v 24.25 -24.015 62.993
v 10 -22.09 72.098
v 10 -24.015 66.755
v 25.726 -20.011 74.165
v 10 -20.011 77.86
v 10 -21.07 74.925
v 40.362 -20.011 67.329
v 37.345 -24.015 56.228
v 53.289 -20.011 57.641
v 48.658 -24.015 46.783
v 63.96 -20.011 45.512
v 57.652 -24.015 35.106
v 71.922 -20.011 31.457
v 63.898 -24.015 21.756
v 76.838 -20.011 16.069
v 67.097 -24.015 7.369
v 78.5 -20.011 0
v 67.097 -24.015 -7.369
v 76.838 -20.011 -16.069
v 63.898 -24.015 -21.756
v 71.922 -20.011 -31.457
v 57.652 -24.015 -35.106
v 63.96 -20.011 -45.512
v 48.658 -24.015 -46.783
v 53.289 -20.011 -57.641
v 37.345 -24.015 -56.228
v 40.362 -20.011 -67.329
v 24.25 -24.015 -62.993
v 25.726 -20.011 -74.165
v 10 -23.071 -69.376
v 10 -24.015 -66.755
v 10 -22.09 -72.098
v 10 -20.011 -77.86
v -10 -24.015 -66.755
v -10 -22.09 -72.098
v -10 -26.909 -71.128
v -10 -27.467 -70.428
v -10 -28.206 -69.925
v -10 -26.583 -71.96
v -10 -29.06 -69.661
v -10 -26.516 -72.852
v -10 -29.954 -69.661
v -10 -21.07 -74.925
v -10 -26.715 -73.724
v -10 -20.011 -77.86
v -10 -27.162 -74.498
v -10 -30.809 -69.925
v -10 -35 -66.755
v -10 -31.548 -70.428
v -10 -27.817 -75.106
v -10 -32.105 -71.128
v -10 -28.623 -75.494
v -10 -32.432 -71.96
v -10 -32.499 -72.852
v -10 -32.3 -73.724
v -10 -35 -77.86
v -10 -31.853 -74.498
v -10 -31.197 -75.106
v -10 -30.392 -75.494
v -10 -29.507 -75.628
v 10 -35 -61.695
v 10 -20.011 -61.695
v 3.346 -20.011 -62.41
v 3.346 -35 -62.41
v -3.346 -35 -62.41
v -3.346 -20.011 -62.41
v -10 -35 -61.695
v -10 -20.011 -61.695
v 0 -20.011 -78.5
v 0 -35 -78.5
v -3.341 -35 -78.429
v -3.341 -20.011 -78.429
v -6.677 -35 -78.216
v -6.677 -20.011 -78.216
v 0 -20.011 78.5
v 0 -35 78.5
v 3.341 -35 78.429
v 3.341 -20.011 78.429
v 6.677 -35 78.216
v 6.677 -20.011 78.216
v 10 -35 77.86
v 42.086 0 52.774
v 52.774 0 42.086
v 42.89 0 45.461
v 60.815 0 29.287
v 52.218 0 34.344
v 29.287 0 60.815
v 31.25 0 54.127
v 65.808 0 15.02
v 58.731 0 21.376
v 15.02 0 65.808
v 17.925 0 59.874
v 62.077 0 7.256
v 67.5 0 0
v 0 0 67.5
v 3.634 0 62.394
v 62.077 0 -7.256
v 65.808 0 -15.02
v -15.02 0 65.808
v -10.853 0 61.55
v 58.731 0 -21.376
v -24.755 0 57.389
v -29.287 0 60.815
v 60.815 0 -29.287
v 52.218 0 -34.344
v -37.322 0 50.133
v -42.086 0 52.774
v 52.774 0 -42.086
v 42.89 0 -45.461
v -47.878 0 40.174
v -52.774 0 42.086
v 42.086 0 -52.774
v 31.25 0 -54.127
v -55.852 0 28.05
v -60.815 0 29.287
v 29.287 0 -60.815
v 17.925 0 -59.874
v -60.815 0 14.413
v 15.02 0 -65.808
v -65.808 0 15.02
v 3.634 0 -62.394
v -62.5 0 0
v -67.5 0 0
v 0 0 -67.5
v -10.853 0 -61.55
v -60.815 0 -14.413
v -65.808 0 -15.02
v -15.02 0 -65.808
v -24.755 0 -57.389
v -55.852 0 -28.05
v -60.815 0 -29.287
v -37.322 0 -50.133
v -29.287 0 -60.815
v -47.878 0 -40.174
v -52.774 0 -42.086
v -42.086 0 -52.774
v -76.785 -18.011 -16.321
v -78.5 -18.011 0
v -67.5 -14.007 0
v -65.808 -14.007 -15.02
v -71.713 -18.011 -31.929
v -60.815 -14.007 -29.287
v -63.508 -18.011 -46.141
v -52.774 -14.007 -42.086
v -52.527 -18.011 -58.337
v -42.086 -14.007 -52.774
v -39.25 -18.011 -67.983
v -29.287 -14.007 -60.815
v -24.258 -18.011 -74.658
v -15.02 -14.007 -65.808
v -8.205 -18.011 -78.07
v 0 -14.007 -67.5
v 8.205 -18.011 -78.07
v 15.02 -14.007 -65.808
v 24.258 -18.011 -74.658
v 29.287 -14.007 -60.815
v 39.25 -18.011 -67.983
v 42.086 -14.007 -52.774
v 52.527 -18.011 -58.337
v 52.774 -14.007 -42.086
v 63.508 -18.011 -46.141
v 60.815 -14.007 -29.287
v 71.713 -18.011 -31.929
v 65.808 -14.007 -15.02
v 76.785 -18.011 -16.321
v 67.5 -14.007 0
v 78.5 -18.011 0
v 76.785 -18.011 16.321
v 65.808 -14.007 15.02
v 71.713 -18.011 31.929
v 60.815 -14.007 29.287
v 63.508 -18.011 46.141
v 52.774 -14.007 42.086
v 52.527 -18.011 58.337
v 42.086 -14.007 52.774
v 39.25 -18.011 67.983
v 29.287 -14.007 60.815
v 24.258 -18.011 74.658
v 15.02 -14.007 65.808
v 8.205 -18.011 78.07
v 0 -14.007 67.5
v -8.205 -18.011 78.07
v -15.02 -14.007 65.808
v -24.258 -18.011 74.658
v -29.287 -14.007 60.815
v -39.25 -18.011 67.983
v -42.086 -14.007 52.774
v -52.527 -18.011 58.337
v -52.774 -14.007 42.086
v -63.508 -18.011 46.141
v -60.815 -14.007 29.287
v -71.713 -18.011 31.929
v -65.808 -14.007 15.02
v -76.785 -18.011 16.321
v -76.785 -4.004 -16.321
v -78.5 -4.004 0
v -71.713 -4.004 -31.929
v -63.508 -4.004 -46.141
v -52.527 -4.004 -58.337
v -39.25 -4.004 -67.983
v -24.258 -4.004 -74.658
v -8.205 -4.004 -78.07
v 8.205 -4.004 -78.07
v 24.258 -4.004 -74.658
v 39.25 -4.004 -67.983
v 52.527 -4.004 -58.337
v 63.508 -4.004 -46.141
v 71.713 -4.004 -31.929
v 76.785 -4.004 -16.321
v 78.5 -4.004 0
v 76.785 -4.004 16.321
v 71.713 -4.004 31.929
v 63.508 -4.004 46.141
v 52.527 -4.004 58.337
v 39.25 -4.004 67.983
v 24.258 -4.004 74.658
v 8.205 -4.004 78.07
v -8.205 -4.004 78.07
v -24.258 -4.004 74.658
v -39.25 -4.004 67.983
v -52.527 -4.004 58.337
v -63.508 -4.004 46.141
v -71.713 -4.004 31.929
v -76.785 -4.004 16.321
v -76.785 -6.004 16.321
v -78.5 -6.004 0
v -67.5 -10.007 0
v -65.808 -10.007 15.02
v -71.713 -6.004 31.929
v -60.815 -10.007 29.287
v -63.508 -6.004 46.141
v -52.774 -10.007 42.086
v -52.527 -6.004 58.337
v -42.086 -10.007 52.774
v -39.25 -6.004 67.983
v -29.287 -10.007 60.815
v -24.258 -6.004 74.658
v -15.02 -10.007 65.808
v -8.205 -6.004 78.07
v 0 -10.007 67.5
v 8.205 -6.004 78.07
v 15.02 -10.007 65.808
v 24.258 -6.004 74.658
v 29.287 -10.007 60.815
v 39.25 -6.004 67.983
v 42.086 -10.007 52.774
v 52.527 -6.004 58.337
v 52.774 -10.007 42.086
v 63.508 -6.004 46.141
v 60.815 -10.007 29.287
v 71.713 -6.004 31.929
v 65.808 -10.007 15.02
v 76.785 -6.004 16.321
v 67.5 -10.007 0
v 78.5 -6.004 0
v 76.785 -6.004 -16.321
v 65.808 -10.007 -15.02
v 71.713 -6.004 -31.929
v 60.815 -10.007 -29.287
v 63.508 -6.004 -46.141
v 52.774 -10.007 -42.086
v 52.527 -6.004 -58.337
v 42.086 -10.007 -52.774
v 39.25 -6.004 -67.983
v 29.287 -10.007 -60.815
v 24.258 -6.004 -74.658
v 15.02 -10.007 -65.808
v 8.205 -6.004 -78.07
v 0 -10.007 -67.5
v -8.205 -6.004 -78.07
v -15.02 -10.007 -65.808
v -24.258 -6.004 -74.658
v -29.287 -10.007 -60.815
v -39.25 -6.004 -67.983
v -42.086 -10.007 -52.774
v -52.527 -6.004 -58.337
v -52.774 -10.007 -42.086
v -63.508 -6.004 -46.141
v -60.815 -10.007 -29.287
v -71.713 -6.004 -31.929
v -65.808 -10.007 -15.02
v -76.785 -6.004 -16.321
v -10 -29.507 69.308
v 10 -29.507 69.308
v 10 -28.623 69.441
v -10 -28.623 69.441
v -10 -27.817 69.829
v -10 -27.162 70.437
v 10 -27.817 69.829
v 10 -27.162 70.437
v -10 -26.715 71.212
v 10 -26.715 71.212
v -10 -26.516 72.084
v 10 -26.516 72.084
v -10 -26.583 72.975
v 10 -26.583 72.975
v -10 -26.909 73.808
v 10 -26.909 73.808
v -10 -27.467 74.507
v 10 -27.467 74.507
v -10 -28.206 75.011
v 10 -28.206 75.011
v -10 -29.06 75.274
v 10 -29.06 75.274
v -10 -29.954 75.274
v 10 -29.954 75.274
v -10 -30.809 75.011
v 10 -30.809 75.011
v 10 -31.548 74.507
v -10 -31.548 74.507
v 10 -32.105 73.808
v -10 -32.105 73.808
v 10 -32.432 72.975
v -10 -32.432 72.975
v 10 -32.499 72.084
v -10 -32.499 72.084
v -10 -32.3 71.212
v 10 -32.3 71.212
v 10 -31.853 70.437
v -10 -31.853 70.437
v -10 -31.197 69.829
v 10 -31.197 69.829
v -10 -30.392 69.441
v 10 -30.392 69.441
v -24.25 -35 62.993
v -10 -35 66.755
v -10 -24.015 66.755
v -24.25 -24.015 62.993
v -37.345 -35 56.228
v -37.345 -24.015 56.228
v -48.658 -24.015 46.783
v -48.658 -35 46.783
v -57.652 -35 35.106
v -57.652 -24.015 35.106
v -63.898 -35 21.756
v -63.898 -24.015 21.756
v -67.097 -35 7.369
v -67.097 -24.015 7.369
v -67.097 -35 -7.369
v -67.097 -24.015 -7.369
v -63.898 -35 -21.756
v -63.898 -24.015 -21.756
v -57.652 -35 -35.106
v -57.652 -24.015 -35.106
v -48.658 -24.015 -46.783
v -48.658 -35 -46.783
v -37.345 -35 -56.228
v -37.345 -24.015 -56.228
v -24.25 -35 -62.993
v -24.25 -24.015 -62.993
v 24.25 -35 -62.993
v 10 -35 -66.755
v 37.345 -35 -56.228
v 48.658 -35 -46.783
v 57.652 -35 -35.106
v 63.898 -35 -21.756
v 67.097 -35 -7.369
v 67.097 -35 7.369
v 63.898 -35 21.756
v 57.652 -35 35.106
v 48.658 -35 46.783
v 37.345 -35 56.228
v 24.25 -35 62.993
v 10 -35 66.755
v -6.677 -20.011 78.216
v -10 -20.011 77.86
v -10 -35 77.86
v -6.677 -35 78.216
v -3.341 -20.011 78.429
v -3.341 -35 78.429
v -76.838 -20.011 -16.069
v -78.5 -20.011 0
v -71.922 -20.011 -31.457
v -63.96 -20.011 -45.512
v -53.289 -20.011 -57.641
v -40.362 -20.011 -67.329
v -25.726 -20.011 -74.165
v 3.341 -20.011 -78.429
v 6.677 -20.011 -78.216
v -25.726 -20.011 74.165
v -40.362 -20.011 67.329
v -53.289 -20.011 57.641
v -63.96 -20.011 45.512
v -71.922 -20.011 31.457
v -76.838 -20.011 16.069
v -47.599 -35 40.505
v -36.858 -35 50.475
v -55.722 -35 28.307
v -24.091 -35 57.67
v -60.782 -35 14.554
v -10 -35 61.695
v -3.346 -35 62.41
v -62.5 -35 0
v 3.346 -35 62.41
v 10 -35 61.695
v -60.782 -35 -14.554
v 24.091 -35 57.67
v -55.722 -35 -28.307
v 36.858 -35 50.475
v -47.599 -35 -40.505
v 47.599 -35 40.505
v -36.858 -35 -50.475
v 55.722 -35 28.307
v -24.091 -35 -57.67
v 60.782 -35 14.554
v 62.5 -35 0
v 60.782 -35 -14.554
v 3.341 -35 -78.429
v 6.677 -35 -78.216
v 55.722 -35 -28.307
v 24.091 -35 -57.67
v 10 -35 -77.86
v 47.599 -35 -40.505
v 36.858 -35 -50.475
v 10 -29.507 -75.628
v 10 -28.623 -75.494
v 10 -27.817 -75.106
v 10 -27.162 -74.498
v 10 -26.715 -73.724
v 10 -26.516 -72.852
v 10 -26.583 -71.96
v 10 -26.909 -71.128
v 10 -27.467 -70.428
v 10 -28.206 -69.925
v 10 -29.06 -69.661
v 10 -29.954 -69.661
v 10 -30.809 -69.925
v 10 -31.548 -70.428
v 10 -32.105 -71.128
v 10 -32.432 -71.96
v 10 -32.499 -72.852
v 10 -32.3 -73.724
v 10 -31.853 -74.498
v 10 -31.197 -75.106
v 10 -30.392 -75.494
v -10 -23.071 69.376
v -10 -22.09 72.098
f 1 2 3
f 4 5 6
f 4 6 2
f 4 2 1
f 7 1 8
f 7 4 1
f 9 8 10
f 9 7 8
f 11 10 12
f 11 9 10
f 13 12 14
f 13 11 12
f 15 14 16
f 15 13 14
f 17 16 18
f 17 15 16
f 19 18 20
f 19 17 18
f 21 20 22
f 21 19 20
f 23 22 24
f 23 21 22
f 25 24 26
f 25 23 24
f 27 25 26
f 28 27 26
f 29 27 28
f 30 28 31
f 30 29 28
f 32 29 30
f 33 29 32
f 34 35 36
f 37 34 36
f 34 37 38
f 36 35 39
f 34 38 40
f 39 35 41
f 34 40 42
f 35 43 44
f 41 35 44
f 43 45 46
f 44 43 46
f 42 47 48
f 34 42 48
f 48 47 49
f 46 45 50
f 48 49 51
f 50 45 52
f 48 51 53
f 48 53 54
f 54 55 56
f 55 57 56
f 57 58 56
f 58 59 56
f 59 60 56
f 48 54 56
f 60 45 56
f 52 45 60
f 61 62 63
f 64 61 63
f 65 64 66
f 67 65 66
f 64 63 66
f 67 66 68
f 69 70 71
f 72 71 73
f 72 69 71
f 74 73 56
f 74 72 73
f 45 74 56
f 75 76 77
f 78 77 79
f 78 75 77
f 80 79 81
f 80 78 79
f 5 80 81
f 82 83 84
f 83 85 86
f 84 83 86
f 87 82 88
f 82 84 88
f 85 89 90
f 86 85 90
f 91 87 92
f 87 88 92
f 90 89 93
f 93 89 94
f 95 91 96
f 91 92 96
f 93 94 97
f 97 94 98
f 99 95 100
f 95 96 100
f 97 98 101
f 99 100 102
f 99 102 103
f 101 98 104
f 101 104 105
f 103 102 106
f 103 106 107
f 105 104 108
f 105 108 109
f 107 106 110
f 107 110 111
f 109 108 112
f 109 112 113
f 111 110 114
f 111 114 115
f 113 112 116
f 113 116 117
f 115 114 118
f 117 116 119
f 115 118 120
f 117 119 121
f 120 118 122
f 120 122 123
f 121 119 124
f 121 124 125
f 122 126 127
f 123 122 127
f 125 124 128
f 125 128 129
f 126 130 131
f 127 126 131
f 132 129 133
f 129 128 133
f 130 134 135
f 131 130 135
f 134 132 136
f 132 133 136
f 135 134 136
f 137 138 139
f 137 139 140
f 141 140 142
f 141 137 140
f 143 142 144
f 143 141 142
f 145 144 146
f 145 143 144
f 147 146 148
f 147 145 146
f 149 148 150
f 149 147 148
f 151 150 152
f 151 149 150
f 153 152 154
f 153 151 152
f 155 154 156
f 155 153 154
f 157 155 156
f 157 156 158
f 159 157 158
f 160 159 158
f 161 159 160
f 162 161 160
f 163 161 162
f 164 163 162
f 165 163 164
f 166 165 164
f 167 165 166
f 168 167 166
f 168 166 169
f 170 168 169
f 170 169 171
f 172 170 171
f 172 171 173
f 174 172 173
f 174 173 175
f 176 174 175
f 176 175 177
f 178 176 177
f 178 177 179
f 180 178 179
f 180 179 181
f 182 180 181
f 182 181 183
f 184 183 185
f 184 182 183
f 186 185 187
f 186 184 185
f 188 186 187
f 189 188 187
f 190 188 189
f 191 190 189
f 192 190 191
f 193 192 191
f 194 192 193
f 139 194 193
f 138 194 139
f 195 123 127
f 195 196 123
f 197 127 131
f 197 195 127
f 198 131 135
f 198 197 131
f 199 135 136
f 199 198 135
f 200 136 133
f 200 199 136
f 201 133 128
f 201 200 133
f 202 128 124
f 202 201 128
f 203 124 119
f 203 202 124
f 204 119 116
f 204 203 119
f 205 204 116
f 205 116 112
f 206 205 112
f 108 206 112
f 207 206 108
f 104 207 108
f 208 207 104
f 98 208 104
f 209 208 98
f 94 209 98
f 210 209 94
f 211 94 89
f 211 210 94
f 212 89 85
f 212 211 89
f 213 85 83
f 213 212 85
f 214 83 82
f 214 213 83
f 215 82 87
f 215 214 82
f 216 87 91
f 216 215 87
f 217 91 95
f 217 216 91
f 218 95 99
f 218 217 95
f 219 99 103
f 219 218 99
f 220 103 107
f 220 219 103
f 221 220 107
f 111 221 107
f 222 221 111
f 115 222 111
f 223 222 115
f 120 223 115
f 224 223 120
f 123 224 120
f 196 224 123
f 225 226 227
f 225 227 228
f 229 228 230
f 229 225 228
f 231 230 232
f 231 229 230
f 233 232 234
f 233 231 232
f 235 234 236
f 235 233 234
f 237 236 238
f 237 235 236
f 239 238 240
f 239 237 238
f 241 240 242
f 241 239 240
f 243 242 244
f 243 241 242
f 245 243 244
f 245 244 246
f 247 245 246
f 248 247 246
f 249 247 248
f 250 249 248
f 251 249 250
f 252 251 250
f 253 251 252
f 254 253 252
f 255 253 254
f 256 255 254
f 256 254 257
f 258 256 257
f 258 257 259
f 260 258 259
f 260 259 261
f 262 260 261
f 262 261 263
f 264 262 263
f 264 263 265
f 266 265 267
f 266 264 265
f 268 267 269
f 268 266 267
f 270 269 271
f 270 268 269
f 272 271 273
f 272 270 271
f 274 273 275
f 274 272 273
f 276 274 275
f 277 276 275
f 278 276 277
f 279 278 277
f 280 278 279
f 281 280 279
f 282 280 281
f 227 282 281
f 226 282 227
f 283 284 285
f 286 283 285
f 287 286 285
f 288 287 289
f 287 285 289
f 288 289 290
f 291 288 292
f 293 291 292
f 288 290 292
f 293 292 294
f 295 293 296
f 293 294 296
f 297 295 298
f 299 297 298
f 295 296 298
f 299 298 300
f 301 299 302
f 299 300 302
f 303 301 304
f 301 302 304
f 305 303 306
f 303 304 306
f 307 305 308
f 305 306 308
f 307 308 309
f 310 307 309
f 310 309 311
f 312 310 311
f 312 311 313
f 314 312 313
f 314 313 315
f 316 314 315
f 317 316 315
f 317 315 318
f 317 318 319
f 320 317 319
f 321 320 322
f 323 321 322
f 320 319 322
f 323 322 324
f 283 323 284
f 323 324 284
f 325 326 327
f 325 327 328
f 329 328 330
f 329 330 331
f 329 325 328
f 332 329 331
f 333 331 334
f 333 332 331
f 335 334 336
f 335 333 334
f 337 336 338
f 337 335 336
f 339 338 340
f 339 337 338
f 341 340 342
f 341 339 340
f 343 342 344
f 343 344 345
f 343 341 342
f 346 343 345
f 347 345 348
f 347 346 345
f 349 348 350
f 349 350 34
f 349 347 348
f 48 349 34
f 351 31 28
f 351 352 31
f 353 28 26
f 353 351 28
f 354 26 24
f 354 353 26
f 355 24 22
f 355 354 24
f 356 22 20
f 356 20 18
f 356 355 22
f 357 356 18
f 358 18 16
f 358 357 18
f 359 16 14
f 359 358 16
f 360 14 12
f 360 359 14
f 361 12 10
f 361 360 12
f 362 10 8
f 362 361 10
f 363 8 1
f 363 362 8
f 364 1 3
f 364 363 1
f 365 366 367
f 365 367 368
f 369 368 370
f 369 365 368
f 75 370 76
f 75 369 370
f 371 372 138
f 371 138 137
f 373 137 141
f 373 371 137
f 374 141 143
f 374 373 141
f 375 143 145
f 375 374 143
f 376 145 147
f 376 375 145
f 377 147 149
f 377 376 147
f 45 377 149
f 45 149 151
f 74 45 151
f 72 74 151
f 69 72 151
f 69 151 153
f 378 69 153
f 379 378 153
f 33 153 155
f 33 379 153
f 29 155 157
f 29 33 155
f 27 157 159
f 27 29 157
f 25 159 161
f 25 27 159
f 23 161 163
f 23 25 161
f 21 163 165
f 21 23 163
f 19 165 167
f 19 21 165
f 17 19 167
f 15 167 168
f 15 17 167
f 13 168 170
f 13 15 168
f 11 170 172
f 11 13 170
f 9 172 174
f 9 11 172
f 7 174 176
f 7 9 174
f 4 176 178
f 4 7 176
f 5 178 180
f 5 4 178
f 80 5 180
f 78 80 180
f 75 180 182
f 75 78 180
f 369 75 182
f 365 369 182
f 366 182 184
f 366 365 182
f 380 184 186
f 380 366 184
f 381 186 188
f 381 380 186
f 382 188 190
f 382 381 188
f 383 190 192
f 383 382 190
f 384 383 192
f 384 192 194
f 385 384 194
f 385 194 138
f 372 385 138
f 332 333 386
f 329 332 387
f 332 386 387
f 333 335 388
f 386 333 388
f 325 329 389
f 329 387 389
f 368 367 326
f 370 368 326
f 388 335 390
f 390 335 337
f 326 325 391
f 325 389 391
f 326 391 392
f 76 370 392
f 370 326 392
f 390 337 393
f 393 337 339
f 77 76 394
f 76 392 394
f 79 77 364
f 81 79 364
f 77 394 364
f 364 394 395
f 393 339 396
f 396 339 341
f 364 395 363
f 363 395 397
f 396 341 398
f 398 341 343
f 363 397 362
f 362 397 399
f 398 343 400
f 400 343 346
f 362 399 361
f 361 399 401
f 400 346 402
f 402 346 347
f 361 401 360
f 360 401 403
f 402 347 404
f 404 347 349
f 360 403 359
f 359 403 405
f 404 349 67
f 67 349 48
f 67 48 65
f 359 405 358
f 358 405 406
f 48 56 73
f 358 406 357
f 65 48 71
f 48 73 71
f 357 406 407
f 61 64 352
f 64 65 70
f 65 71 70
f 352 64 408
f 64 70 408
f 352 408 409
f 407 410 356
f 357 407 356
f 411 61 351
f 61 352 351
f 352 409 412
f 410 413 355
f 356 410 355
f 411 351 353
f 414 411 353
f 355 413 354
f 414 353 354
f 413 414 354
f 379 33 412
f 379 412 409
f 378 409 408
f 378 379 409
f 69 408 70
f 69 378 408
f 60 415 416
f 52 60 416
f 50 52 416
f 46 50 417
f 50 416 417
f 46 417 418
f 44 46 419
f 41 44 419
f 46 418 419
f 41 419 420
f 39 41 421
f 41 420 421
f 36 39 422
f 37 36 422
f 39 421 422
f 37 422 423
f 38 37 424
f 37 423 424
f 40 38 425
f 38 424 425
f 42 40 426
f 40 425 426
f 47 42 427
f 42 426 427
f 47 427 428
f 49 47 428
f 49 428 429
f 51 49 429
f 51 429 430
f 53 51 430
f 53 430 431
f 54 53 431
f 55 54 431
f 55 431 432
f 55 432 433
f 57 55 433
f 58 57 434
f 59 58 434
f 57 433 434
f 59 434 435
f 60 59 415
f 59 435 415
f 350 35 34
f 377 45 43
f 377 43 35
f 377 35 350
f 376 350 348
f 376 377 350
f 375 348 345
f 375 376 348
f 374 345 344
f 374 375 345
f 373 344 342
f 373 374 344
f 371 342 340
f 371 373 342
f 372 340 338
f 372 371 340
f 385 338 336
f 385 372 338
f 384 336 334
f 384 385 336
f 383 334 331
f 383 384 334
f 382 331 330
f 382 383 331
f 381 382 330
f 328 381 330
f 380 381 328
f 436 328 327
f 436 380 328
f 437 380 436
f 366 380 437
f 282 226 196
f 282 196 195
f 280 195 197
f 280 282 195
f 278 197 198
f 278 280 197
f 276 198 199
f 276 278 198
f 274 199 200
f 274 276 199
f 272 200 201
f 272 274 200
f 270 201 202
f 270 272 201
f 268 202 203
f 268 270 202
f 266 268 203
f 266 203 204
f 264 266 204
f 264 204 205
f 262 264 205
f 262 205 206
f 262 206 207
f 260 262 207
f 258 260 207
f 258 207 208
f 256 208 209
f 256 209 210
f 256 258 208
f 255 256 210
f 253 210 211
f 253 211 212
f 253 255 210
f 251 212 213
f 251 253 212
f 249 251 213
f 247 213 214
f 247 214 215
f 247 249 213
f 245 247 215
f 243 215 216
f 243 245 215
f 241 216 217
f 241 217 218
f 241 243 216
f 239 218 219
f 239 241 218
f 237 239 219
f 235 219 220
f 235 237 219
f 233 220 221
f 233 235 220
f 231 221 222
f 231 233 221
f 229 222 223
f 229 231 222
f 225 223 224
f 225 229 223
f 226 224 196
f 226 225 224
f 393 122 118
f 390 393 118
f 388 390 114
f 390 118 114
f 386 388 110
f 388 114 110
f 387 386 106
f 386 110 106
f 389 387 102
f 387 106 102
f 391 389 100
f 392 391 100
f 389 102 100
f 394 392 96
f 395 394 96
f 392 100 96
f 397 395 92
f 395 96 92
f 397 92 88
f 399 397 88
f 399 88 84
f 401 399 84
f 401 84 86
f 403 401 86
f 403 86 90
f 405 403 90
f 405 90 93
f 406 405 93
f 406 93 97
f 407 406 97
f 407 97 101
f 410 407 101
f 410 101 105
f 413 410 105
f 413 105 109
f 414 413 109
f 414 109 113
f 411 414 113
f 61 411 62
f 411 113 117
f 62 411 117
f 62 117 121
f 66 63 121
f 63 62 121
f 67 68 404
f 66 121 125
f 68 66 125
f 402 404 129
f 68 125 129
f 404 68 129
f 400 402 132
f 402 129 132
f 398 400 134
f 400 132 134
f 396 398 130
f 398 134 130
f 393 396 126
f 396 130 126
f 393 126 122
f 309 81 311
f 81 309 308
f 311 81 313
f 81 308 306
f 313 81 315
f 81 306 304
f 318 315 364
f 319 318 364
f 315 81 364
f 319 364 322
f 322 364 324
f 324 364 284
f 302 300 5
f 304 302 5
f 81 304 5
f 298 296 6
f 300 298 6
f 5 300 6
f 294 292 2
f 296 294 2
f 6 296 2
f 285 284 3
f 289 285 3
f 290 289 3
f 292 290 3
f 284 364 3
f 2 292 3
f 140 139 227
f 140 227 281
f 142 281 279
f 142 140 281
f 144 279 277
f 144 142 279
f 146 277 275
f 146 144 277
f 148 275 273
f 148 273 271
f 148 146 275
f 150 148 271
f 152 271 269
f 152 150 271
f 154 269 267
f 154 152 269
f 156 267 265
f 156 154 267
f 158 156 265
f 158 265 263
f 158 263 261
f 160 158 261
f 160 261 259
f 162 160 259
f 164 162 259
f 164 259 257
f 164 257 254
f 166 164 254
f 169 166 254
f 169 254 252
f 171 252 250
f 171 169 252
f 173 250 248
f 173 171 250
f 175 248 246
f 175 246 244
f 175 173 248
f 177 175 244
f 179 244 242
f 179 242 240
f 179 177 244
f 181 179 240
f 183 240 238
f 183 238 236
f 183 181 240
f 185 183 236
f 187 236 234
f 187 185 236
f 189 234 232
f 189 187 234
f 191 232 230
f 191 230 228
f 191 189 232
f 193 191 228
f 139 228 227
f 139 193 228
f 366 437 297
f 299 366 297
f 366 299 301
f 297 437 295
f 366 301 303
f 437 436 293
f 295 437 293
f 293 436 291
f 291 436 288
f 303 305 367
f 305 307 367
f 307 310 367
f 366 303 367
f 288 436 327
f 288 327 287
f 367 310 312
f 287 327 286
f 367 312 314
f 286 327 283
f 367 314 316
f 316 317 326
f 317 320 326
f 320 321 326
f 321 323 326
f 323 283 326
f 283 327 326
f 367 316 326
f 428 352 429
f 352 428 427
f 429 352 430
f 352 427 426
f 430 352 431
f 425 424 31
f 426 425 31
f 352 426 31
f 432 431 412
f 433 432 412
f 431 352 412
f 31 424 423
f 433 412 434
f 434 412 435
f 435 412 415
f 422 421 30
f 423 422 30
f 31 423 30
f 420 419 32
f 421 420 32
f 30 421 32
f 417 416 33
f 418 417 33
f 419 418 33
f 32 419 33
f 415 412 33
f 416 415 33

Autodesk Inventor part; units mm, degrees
ref_plane "YZ Plane" through (0, 0, 0) normal (1, 0, 0) x (0, 1, 0)
sketch "Sketch1" plane through (0, 0, 0) normal (0, 0, 1) x (1, 0, 0)
  line L0 (0, 0) -> (-171.0711, 0) construction
  line L1 (0, 0) -> (0, -629.6601) construction
  line L2 (-62.5, 0) -> (-62.5, -35)
  line L3 (-62.5, -35) -> (-67.5, -35)
  line L4 (-62.5, 0) -> (-67.5, 0)
  line L5 (-67.5, 0) -> (-78.5, -4.0037)
  line L6 (-78.5, -4.0037) -> (-78.5, -6.0037)
  line L7 (-78.5, -6.0037) -> (-67.5, -10.0073)
  line L8 (-67.5, -10.0073) -> (-67.5, -14.0073)
  line L9 (-67.5, -14.0073) -> (-78.5, -18.011)
  line L10 (-78.5, -18.011) -> (-78.5, -20.011)
  line L11 (-67.5, -35) -> (-67.5, 0) construction
  line L12 (-78.5, -20.011) -> (-67.5, -24.0147)
  line L13 (-78.5, -20.011) -> (-66.794, -20.011) construction
  line L14 (-67.5, -24.0147) -> (-67.5, -35)
  line L15 (-62.5, -33.4145) -> (-62.8994, -35)
  dimension "d1" = 35
  dimension "d2" = 5
  dimension "d3" = 5
  dimension "d6" = 2
  dimension "d8" = 2
  dimension "d10" = 40
  dimension "d11" = 62.5
  dimension "d12" = 20
  dimension "d13" = 4
  dimension "d14" = 11
  dimension "d15" = 5
revolve "Revolution1" add sketch "Sketch1" angle 360 about axis through (0, 0, 0) along (0, -1, 0)
sketch "Sketch2" plane through (0, 0, 0) normal (0, 0, 1) x (1, 0, 0)
  point P0 (0, 0)
sketch "Sketch3" plane through (0, 0, 0) normal (1, 0, 0) x (0, 1, 0)
  line L0 (-6.0037, -78.5) -> (-4.0037, -78.5) projected
  line L1 (-20.011, -78.5) -> (-18.011, -78.5) projected
  line L2 (-4.0037, -78.5) -> (-20.011, -78.5)
  line L3 (-6.0037, -78.5) -> (-6.0037, 78.5) projected
  line L4 (-6.0037, 78.5) -> (-4.0037, 78.5) projected
  line L5 (-20.011, 78.5) -> (-18.011, 78.5) projected
  line L6 (-20.011, -78.5) -> (-20.011, 78.5) projected
  line L7 (-20.011, 78.5) -> (-4.0037, 78.5)
  point P0 (0, 0)
ref_plane "Work Plane1" through (0, -4.0037, -78.5) normal (0, 0, -1) x (-1, 0, 0)
sketch "Sketch4" plane through (0, -4.0037, -78.5) normal (0, 0, -1) x (-1, 0, 0)
  line L0 (67.5, -30.9963) -> (-67.5, -30.9963) projected
  line L1 (10, -30.9963) -> (-10, -30.9963)
  line L2 (-10, -30.9963) -> (-10, -16.0073)
  line L3 (-10, -16.0073) -> (10, -16.0073)
  line L4 (10, -16.0073) -> (10, -30.9963)
  line L5 (0, 0) -> (0, -16.0073) projected
  point P0 (0, 4.0037)
  dimension "d17" = 20
  dimension "d18" = 10
ref_plane "Work Plane2" through (0, -20.011, 78.5) normal (0, 0, 1) x (1, 0, 0)
extrude "Extrusion1" add sketch "Sketch4" against normal up to surface (157 mm away)
sketch "Sketch5" plane through (0, -20.011, 0) normal (0, 1, 0) x (1, 0, 0)
  circle A0 centre (0, 0) radius 62.5 projected
  arc A1 (-10, -61.6948) -> (10, -61.6948) centre (0, 0) ccw projected
  line L0 (10, 61.6948) -> (10, -61.6948) projected
  arc A2 (10, 61.6948) -> (-10, 61.6948) centre (0, 0) ccw projected
  line L1 (-10, 61.6948) -> (-10, -61.6948) projected
  arc A3 (-10, -77.8605) -> (0, -78.5) centre (0, 0) ccw projected
  line L2 (-10, -77.8605) -> (-10, -78.5) projected
  line L3 (-10, -78.5) -> (0, -78.5) projected
  arc A4 (0, -78.5) -> (10, -77.8605) centre (0, 0) ccw projected
  line L4 (0, -78.5) -> (10, -78.5) projected
  line L5 (10, -77.8605) -> (10, -78.5) projected
  arc A5 (0, 78.5) -> (-10, 77.8605) centre (0, 0) ccw projected
  line L6 (-10, 78.5) -> (0, 78.5) projected
  line L7 (-10, 78.5) -> (-10, 77.8605) projected
  arc A6 (10, 77.8605) -> (0, 78.5) centre (0, 0) ccw projected
  line L8 (10, 78.5) -> (10, 77.8605) projected
  line L9 (0, 78.5) -> (10, 78.5) projected
  point P0 (0, -78.5)
  point P1 (0, -78.5)
  point P2 (0, -78.5)
  point P3 (0, -78.5)
  point P4 (-10, 61.6948)
  point P5 (-10, -61.6948)
  point P6 (10, -61.6948)
extrude "Extrusion2" cut sketch "Sketch5" against normal through all contours L0 A0 L1 | A4 L5 L4 | A3 L3 L2 | A5 L7 L6 | L9 L8 A6
sketch "Sketch6" plane through (10, -35, -77.8605) normal (1, 0, 0) x (0, 0, -1)
  line L0 (0, 0) -> (0.6395, 0) construction
  line L1 (-11.1053, 10.9853) -> (-11.1053, 0) construction
  line L2 (0.6395, 0) -> (-11.1053, 10.9853) construction
  circle A0 centre (-5.2329, 5.4927) radius 3
  line L3 (-144.6156, 10.9853) -> (-144.6156, 0) construction
  line L4 (-155.7209, 14.989) -> (-155.7209, 0) construction
  line L5 (-144.6156, 10.9853) -> (-155.7209, 0) construction
  circle A1 centre (-150.1683, 5.4927) radius 3
  point P0 (-77.8605, 35)
  dimension "d23" = 6
  dimension "d24" = 6
extrude "Extrusion3" cut sketch "Sketch6" against normal through all
properties part number "adapter_za_motor"
